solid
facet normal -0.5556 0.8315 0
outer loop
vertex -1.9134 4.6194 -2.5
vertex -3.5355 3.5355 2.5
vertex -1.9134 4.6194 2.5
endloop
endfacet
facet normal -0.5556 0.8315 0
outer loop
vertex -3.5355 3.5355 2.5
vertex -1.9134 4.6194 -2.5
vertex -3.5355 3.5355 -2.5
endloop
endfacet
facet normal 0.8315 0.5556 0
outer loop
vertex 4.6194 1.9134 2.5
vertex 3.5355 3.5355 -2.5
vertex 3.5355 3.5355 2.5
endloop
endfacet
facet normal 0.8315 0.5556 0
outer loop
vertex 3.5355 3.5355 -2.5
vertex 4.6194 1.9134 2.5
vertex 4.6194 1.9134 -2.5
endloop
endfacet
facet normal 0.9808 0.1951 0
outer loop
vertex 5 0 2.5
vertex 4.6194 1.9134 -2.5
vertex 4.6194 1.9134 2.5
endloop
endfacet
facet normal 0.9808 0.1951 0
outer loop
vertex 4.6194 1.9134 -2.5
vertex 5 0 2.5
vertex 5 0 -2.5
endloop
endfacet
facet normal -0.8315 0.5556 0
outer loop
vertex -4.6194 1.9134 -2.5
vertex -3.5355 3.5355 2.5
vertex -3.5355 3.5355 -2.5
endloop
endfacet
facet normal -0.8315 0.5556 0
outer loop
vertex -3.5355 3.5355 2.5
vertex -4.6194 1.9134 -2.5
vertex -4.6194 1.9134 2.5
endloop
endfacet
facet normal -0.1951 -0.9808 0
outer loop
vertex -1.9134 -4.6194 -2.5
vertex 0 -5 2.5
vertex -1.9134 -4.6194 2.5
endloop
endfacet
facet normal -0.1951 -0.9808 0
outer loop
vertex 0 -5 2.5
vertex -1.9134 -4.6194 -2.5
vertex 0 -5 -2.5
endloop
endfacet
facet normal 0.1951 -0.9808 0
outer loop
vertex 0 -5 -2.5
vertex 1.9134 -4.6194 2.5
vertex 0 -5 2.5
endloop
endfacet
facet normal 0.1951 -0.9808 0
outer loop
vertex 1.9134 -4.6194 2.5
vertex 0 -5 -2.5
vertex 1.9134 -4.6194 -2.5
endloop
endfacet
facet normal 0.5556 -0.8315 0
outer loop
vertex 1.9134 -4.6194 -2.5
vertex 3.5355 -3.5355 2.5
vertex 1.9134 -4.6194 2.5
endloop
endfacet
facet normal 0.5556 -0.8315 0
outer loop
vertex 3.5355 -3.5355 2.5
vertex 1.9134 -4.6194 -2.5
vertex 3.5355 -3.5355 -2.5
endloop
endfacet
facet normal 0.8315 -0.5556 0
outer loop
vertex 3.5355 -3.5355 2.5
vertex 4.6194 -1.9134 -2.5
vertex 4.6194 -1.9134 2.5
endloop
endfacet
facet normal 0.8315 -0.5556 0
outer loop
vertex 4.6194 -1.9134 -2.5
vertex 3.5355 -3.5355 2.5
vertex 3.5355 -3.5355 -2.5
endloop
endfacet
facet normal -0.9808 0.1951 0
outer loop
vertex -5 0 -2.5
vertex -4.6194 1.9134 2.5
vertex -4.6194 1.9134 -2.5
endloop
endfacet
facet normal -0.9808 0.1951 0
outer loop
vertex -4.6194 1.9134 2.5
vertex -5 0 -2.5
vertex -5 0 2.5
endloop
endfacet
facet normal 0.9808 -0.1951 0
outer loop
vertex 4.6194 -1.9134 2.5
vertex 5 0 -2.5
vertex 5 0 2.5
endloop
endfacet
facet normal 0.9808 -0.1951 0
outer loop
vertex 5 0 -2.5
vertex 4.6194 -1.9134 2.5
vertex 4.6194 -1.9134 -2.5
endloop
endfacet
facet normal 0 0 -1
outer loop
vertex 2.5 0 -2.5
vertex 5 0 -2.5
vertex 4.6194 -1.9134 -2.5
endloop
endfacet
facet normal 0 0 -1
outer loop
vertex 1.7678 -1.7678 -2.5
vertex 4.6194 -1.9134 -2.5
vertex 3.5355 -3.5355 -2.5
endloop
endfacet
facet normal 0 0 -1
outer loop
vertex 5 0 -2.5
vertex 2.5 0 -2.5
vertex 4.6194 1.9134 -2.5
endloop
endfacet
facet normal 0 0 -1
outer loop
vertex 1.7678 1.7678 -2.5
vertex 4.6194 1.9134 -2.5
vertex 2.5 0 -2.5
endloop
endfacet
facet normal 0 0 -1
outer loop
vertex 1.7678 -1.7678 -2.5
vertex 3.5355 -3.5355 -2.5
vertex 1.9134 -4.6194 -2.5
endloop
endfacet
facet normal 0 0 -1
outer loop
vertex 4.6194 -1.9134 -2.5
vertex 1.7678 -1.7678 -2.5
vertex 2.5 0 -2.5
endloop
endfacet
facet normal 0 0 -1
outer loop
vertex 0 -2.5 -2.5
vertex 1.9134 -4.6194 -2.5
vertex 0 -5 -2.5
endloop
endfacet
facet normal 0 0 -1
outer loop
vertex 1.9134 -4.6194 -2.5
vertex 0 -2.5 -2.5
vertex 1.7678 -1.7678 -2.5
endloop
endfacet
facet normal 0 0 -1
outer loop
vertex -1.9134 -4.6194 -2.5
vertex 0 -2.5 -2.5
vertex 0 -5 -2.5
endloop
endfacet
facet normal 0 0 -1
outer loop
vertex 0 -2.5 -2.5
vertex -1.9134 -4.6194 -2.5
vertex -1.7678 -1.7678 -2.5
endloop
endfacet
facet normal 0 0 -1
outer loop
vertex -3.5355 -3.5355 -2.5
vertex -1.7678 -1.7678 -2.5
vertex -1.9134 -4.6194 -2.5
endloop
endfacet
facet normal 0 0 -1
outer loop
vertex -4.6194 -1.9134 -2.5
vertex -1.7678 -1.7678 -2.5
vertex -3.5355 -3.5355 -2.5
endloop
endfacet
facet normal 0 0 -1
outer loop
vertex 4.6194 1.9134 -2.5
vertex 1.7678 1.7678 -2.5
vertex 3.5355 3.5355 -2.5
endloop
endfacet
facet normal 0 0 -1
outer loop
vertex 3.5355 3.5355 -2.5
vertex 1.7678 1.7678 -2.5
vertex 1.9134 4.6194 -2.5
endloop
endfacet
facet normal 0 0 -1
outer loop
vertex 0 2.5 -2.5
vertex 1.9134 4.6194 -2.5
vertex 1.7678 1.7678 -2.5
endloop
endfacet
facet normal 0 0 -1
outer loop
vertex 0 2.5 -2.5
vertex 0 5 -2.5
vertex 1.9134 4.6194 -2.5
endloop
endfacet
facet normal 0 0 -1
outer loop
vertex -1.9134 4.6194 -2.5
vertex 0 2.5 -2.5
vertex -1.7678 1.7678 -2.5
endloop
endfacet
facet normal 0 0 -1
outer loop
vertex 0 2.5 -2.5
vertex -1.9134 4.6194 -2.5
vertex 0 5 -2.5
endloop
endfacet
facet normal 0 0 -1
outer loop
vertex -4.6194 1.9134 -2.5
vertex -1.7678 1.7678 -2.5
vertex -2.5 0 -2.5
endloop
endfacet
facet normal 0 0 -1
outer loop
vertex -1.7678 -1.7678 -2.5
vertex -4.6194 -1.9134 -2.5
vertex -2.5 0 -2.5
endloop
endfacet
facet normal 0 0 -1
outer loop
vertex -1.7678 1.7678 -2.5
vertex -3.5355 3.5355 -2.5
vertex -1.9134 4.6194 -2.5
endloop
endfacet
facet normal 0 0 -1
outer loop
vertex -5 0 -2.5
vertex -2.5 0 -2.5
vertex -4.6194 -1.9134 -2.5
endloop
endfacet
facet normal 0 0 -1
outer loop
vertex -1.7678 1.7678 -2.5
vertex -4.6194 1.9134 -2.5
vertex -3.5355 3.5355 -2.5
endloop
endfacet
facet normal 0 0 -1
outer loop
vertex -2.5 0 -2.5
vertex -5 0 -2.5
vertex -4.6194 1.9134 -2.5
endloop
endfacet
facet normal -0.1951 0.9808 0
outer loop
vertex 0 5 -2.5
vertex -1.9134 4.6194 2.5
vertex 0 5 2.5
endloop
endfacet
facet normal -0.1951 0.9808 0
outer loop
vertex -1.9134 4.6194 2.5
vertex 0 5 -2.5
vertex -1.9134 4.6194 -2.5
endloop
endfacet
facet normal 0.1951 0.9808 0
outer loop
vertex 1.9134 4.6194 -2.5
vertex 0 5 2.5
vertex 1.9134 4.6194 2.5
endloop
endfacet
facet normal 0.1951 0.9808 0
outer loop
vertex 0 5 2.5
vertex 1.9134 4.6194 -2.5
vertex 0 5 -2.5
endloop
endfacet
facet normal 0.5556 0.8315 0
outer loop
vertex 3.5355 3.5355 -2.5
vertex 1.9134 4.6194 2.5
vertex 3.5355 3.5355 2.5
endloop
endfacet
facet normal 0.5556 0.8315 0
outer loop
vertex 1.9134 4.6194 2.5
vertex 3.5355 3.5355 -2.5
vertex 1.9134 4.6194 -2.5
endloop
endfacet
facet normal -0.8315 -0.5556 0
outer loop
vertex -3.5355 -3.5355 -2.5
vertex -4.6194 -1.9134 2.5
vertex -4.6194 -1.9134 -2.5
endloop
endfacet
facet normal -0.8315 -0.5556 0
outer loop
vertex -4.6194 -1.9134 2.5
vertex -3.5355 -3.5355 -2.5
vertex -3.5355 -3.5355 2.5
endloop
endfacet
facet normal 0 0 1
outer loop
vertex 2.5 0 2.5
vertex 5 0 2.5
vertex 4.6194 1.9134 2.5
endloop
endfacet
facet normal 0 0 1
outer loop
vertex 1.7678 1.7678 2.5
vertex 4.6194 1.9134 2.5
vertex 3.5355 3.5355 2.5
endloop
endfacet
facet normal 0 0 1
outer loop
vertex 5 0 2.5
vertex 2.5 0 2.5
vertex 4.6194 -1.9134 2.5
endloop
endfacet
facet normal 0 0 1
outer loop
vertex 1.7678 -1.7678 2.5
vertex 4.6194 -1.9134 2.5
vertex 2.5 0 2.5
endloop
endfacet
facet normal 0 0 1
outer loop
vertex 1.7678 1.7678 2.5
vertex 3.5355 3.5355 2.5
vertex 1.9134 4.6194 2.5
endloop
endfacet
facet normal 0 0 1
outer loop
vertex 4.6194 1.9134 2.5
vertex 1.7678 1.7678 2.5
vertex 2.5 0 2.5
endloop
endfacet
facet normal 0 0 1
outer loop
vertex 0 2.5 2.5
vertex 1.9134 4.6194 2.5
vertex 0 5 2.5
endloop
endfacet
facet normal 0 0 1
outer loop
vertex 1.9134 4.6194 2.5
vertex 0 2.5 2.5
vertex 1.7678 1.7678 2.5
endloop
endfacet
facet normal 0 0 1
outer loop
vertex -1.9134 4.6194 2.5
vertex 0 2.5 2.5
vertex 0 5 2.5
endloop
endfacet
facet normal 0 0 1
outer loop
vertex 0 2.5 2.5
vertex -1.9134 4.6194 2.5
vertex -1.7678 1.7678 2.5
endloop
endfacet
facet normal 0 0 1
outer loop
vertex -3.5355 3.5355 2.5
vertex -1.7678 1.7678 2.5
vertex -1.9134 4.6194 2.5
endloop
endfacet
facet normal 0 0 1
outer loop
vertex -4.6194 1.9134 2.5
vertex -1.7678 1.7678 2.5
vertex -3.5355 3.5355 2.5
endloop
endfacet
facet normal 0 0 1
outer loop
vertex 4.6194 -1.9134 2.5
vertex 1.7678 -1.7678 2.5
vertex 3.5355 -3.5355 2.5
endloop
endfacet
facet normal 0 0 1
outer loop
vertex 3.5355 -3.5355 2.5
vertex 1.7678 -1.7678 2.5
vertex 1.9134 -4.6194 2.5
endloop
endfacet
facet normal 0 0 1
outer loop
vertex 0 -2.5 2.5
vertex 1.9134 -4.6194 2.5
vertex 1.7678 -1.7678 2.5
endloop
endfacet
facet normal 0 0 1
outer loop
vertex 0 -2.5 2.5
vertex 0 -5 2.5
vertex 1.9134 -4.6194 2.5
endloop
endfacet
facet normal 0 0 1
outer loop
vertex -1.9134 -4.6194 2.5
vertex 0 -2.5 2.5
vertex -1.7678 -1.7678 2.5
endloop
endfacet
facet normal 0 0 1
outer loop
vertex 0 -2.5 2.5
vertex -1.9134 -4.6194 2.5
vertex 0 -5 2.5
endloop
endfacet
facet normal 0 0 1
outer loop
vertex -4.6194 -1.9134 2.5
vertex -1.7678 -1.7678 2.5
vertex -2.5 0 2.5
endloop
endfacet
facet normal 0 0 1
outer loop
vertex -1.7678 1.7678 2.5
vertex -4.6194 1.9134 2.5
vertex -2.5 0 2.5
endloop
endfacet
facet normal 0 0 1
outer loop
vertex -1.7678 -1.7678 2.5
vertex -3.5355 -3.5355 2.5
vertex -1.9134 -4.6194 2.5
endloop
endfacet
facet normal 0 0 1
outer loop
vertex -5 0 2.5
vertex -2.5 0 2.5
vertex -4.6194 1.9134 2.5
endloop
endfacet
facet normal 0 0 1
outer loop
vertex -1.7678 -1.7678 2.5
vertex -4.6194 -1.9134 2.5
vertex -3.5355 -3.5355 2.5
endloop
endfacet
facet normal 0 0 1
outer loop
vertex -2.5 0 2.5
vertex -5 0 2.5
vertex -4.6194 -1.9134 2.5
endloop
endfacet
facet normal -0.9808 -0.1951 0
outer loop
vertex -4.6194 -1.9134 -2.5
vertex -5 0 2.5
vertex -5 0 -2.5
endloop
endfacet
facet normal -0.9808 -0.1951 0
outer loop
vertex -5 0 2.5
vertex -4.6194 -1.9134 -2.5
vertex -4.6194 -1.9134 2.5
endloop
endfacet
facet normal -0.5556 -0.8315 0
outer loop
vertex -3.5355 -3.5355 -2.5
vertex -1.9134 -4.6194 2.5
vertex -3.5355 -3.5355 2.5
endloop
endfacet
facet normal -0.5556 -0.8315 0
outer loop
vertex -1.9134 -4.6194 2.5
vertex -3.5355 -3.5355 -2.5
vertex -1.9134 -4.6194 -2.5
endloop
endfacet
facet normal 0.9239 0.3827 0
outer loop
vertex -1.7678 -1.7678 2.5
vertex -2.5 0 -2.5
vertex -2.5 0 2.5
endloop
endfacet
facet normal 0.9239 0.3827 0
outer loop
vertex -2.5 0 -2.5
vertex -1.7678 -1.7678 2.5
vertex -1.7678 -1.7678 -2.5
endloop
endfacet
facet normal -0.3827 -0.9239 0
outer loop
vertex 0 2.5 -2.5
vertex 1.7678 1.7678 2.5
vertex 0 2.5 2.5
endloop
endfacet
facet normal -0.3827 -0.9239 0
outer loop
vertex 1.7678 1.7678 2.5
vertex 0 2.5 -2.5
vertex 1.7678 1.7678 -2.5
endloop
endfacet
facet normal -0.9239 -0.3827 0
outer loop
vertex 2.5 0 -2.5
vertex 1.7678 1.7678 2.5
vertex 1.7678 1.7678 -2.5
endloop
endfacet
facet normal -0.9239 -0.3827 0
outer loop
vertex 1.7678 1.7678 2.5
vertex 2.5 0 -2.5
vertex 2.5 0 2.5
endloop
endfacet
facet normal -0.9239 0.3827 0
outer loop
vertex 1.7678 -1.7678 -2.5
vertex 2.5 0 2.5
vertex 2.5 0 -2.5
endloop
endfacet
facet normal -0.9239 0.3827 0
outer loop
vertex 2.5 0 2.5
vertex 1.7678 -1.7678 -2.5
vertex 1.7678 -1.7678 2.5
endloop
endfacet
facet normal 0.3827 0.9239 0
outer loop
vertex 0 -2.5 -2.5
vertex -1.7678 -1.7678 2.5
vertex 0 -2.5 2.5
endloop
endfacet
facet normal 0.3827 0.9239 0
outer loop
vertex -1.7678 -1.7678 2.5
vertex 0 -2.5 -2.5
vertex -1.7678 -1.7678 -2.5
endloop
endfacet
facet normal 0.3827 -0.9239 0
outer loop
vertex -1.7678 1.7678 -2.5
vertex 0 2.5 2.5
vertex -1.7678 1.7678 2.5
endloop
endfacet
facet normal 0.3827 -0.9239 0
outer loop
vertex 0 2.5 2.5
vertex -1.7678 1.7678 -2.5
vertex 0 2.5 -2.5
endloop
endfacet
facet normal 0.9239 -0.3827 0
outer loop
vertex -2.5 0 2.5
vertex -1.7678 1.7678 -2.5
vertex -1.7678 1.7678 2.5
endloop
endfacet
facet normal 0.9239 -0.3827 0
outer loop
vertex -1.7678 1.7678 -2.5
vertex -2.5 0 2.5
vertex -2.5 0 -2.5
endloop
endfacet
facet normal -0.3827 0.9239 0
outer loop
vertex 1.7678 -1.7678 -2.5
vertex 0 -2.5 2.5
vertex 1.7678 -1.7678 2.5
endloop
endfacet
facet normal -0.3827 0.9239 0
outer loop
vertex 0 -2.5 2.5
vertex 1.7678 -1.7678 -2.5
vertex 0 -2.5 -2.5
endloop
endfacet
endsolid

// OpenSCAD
// some defaults for testing
ID = 5;
OD = 10;
width = 5;



module ring(ID, OD, width) {
    difference() {
	    cylinder(r=OD/2, h=width, center=true);
	    cylinder(r=ID/2, h=width+2, center=true);
	}
}

ring(ID, OD, width);
